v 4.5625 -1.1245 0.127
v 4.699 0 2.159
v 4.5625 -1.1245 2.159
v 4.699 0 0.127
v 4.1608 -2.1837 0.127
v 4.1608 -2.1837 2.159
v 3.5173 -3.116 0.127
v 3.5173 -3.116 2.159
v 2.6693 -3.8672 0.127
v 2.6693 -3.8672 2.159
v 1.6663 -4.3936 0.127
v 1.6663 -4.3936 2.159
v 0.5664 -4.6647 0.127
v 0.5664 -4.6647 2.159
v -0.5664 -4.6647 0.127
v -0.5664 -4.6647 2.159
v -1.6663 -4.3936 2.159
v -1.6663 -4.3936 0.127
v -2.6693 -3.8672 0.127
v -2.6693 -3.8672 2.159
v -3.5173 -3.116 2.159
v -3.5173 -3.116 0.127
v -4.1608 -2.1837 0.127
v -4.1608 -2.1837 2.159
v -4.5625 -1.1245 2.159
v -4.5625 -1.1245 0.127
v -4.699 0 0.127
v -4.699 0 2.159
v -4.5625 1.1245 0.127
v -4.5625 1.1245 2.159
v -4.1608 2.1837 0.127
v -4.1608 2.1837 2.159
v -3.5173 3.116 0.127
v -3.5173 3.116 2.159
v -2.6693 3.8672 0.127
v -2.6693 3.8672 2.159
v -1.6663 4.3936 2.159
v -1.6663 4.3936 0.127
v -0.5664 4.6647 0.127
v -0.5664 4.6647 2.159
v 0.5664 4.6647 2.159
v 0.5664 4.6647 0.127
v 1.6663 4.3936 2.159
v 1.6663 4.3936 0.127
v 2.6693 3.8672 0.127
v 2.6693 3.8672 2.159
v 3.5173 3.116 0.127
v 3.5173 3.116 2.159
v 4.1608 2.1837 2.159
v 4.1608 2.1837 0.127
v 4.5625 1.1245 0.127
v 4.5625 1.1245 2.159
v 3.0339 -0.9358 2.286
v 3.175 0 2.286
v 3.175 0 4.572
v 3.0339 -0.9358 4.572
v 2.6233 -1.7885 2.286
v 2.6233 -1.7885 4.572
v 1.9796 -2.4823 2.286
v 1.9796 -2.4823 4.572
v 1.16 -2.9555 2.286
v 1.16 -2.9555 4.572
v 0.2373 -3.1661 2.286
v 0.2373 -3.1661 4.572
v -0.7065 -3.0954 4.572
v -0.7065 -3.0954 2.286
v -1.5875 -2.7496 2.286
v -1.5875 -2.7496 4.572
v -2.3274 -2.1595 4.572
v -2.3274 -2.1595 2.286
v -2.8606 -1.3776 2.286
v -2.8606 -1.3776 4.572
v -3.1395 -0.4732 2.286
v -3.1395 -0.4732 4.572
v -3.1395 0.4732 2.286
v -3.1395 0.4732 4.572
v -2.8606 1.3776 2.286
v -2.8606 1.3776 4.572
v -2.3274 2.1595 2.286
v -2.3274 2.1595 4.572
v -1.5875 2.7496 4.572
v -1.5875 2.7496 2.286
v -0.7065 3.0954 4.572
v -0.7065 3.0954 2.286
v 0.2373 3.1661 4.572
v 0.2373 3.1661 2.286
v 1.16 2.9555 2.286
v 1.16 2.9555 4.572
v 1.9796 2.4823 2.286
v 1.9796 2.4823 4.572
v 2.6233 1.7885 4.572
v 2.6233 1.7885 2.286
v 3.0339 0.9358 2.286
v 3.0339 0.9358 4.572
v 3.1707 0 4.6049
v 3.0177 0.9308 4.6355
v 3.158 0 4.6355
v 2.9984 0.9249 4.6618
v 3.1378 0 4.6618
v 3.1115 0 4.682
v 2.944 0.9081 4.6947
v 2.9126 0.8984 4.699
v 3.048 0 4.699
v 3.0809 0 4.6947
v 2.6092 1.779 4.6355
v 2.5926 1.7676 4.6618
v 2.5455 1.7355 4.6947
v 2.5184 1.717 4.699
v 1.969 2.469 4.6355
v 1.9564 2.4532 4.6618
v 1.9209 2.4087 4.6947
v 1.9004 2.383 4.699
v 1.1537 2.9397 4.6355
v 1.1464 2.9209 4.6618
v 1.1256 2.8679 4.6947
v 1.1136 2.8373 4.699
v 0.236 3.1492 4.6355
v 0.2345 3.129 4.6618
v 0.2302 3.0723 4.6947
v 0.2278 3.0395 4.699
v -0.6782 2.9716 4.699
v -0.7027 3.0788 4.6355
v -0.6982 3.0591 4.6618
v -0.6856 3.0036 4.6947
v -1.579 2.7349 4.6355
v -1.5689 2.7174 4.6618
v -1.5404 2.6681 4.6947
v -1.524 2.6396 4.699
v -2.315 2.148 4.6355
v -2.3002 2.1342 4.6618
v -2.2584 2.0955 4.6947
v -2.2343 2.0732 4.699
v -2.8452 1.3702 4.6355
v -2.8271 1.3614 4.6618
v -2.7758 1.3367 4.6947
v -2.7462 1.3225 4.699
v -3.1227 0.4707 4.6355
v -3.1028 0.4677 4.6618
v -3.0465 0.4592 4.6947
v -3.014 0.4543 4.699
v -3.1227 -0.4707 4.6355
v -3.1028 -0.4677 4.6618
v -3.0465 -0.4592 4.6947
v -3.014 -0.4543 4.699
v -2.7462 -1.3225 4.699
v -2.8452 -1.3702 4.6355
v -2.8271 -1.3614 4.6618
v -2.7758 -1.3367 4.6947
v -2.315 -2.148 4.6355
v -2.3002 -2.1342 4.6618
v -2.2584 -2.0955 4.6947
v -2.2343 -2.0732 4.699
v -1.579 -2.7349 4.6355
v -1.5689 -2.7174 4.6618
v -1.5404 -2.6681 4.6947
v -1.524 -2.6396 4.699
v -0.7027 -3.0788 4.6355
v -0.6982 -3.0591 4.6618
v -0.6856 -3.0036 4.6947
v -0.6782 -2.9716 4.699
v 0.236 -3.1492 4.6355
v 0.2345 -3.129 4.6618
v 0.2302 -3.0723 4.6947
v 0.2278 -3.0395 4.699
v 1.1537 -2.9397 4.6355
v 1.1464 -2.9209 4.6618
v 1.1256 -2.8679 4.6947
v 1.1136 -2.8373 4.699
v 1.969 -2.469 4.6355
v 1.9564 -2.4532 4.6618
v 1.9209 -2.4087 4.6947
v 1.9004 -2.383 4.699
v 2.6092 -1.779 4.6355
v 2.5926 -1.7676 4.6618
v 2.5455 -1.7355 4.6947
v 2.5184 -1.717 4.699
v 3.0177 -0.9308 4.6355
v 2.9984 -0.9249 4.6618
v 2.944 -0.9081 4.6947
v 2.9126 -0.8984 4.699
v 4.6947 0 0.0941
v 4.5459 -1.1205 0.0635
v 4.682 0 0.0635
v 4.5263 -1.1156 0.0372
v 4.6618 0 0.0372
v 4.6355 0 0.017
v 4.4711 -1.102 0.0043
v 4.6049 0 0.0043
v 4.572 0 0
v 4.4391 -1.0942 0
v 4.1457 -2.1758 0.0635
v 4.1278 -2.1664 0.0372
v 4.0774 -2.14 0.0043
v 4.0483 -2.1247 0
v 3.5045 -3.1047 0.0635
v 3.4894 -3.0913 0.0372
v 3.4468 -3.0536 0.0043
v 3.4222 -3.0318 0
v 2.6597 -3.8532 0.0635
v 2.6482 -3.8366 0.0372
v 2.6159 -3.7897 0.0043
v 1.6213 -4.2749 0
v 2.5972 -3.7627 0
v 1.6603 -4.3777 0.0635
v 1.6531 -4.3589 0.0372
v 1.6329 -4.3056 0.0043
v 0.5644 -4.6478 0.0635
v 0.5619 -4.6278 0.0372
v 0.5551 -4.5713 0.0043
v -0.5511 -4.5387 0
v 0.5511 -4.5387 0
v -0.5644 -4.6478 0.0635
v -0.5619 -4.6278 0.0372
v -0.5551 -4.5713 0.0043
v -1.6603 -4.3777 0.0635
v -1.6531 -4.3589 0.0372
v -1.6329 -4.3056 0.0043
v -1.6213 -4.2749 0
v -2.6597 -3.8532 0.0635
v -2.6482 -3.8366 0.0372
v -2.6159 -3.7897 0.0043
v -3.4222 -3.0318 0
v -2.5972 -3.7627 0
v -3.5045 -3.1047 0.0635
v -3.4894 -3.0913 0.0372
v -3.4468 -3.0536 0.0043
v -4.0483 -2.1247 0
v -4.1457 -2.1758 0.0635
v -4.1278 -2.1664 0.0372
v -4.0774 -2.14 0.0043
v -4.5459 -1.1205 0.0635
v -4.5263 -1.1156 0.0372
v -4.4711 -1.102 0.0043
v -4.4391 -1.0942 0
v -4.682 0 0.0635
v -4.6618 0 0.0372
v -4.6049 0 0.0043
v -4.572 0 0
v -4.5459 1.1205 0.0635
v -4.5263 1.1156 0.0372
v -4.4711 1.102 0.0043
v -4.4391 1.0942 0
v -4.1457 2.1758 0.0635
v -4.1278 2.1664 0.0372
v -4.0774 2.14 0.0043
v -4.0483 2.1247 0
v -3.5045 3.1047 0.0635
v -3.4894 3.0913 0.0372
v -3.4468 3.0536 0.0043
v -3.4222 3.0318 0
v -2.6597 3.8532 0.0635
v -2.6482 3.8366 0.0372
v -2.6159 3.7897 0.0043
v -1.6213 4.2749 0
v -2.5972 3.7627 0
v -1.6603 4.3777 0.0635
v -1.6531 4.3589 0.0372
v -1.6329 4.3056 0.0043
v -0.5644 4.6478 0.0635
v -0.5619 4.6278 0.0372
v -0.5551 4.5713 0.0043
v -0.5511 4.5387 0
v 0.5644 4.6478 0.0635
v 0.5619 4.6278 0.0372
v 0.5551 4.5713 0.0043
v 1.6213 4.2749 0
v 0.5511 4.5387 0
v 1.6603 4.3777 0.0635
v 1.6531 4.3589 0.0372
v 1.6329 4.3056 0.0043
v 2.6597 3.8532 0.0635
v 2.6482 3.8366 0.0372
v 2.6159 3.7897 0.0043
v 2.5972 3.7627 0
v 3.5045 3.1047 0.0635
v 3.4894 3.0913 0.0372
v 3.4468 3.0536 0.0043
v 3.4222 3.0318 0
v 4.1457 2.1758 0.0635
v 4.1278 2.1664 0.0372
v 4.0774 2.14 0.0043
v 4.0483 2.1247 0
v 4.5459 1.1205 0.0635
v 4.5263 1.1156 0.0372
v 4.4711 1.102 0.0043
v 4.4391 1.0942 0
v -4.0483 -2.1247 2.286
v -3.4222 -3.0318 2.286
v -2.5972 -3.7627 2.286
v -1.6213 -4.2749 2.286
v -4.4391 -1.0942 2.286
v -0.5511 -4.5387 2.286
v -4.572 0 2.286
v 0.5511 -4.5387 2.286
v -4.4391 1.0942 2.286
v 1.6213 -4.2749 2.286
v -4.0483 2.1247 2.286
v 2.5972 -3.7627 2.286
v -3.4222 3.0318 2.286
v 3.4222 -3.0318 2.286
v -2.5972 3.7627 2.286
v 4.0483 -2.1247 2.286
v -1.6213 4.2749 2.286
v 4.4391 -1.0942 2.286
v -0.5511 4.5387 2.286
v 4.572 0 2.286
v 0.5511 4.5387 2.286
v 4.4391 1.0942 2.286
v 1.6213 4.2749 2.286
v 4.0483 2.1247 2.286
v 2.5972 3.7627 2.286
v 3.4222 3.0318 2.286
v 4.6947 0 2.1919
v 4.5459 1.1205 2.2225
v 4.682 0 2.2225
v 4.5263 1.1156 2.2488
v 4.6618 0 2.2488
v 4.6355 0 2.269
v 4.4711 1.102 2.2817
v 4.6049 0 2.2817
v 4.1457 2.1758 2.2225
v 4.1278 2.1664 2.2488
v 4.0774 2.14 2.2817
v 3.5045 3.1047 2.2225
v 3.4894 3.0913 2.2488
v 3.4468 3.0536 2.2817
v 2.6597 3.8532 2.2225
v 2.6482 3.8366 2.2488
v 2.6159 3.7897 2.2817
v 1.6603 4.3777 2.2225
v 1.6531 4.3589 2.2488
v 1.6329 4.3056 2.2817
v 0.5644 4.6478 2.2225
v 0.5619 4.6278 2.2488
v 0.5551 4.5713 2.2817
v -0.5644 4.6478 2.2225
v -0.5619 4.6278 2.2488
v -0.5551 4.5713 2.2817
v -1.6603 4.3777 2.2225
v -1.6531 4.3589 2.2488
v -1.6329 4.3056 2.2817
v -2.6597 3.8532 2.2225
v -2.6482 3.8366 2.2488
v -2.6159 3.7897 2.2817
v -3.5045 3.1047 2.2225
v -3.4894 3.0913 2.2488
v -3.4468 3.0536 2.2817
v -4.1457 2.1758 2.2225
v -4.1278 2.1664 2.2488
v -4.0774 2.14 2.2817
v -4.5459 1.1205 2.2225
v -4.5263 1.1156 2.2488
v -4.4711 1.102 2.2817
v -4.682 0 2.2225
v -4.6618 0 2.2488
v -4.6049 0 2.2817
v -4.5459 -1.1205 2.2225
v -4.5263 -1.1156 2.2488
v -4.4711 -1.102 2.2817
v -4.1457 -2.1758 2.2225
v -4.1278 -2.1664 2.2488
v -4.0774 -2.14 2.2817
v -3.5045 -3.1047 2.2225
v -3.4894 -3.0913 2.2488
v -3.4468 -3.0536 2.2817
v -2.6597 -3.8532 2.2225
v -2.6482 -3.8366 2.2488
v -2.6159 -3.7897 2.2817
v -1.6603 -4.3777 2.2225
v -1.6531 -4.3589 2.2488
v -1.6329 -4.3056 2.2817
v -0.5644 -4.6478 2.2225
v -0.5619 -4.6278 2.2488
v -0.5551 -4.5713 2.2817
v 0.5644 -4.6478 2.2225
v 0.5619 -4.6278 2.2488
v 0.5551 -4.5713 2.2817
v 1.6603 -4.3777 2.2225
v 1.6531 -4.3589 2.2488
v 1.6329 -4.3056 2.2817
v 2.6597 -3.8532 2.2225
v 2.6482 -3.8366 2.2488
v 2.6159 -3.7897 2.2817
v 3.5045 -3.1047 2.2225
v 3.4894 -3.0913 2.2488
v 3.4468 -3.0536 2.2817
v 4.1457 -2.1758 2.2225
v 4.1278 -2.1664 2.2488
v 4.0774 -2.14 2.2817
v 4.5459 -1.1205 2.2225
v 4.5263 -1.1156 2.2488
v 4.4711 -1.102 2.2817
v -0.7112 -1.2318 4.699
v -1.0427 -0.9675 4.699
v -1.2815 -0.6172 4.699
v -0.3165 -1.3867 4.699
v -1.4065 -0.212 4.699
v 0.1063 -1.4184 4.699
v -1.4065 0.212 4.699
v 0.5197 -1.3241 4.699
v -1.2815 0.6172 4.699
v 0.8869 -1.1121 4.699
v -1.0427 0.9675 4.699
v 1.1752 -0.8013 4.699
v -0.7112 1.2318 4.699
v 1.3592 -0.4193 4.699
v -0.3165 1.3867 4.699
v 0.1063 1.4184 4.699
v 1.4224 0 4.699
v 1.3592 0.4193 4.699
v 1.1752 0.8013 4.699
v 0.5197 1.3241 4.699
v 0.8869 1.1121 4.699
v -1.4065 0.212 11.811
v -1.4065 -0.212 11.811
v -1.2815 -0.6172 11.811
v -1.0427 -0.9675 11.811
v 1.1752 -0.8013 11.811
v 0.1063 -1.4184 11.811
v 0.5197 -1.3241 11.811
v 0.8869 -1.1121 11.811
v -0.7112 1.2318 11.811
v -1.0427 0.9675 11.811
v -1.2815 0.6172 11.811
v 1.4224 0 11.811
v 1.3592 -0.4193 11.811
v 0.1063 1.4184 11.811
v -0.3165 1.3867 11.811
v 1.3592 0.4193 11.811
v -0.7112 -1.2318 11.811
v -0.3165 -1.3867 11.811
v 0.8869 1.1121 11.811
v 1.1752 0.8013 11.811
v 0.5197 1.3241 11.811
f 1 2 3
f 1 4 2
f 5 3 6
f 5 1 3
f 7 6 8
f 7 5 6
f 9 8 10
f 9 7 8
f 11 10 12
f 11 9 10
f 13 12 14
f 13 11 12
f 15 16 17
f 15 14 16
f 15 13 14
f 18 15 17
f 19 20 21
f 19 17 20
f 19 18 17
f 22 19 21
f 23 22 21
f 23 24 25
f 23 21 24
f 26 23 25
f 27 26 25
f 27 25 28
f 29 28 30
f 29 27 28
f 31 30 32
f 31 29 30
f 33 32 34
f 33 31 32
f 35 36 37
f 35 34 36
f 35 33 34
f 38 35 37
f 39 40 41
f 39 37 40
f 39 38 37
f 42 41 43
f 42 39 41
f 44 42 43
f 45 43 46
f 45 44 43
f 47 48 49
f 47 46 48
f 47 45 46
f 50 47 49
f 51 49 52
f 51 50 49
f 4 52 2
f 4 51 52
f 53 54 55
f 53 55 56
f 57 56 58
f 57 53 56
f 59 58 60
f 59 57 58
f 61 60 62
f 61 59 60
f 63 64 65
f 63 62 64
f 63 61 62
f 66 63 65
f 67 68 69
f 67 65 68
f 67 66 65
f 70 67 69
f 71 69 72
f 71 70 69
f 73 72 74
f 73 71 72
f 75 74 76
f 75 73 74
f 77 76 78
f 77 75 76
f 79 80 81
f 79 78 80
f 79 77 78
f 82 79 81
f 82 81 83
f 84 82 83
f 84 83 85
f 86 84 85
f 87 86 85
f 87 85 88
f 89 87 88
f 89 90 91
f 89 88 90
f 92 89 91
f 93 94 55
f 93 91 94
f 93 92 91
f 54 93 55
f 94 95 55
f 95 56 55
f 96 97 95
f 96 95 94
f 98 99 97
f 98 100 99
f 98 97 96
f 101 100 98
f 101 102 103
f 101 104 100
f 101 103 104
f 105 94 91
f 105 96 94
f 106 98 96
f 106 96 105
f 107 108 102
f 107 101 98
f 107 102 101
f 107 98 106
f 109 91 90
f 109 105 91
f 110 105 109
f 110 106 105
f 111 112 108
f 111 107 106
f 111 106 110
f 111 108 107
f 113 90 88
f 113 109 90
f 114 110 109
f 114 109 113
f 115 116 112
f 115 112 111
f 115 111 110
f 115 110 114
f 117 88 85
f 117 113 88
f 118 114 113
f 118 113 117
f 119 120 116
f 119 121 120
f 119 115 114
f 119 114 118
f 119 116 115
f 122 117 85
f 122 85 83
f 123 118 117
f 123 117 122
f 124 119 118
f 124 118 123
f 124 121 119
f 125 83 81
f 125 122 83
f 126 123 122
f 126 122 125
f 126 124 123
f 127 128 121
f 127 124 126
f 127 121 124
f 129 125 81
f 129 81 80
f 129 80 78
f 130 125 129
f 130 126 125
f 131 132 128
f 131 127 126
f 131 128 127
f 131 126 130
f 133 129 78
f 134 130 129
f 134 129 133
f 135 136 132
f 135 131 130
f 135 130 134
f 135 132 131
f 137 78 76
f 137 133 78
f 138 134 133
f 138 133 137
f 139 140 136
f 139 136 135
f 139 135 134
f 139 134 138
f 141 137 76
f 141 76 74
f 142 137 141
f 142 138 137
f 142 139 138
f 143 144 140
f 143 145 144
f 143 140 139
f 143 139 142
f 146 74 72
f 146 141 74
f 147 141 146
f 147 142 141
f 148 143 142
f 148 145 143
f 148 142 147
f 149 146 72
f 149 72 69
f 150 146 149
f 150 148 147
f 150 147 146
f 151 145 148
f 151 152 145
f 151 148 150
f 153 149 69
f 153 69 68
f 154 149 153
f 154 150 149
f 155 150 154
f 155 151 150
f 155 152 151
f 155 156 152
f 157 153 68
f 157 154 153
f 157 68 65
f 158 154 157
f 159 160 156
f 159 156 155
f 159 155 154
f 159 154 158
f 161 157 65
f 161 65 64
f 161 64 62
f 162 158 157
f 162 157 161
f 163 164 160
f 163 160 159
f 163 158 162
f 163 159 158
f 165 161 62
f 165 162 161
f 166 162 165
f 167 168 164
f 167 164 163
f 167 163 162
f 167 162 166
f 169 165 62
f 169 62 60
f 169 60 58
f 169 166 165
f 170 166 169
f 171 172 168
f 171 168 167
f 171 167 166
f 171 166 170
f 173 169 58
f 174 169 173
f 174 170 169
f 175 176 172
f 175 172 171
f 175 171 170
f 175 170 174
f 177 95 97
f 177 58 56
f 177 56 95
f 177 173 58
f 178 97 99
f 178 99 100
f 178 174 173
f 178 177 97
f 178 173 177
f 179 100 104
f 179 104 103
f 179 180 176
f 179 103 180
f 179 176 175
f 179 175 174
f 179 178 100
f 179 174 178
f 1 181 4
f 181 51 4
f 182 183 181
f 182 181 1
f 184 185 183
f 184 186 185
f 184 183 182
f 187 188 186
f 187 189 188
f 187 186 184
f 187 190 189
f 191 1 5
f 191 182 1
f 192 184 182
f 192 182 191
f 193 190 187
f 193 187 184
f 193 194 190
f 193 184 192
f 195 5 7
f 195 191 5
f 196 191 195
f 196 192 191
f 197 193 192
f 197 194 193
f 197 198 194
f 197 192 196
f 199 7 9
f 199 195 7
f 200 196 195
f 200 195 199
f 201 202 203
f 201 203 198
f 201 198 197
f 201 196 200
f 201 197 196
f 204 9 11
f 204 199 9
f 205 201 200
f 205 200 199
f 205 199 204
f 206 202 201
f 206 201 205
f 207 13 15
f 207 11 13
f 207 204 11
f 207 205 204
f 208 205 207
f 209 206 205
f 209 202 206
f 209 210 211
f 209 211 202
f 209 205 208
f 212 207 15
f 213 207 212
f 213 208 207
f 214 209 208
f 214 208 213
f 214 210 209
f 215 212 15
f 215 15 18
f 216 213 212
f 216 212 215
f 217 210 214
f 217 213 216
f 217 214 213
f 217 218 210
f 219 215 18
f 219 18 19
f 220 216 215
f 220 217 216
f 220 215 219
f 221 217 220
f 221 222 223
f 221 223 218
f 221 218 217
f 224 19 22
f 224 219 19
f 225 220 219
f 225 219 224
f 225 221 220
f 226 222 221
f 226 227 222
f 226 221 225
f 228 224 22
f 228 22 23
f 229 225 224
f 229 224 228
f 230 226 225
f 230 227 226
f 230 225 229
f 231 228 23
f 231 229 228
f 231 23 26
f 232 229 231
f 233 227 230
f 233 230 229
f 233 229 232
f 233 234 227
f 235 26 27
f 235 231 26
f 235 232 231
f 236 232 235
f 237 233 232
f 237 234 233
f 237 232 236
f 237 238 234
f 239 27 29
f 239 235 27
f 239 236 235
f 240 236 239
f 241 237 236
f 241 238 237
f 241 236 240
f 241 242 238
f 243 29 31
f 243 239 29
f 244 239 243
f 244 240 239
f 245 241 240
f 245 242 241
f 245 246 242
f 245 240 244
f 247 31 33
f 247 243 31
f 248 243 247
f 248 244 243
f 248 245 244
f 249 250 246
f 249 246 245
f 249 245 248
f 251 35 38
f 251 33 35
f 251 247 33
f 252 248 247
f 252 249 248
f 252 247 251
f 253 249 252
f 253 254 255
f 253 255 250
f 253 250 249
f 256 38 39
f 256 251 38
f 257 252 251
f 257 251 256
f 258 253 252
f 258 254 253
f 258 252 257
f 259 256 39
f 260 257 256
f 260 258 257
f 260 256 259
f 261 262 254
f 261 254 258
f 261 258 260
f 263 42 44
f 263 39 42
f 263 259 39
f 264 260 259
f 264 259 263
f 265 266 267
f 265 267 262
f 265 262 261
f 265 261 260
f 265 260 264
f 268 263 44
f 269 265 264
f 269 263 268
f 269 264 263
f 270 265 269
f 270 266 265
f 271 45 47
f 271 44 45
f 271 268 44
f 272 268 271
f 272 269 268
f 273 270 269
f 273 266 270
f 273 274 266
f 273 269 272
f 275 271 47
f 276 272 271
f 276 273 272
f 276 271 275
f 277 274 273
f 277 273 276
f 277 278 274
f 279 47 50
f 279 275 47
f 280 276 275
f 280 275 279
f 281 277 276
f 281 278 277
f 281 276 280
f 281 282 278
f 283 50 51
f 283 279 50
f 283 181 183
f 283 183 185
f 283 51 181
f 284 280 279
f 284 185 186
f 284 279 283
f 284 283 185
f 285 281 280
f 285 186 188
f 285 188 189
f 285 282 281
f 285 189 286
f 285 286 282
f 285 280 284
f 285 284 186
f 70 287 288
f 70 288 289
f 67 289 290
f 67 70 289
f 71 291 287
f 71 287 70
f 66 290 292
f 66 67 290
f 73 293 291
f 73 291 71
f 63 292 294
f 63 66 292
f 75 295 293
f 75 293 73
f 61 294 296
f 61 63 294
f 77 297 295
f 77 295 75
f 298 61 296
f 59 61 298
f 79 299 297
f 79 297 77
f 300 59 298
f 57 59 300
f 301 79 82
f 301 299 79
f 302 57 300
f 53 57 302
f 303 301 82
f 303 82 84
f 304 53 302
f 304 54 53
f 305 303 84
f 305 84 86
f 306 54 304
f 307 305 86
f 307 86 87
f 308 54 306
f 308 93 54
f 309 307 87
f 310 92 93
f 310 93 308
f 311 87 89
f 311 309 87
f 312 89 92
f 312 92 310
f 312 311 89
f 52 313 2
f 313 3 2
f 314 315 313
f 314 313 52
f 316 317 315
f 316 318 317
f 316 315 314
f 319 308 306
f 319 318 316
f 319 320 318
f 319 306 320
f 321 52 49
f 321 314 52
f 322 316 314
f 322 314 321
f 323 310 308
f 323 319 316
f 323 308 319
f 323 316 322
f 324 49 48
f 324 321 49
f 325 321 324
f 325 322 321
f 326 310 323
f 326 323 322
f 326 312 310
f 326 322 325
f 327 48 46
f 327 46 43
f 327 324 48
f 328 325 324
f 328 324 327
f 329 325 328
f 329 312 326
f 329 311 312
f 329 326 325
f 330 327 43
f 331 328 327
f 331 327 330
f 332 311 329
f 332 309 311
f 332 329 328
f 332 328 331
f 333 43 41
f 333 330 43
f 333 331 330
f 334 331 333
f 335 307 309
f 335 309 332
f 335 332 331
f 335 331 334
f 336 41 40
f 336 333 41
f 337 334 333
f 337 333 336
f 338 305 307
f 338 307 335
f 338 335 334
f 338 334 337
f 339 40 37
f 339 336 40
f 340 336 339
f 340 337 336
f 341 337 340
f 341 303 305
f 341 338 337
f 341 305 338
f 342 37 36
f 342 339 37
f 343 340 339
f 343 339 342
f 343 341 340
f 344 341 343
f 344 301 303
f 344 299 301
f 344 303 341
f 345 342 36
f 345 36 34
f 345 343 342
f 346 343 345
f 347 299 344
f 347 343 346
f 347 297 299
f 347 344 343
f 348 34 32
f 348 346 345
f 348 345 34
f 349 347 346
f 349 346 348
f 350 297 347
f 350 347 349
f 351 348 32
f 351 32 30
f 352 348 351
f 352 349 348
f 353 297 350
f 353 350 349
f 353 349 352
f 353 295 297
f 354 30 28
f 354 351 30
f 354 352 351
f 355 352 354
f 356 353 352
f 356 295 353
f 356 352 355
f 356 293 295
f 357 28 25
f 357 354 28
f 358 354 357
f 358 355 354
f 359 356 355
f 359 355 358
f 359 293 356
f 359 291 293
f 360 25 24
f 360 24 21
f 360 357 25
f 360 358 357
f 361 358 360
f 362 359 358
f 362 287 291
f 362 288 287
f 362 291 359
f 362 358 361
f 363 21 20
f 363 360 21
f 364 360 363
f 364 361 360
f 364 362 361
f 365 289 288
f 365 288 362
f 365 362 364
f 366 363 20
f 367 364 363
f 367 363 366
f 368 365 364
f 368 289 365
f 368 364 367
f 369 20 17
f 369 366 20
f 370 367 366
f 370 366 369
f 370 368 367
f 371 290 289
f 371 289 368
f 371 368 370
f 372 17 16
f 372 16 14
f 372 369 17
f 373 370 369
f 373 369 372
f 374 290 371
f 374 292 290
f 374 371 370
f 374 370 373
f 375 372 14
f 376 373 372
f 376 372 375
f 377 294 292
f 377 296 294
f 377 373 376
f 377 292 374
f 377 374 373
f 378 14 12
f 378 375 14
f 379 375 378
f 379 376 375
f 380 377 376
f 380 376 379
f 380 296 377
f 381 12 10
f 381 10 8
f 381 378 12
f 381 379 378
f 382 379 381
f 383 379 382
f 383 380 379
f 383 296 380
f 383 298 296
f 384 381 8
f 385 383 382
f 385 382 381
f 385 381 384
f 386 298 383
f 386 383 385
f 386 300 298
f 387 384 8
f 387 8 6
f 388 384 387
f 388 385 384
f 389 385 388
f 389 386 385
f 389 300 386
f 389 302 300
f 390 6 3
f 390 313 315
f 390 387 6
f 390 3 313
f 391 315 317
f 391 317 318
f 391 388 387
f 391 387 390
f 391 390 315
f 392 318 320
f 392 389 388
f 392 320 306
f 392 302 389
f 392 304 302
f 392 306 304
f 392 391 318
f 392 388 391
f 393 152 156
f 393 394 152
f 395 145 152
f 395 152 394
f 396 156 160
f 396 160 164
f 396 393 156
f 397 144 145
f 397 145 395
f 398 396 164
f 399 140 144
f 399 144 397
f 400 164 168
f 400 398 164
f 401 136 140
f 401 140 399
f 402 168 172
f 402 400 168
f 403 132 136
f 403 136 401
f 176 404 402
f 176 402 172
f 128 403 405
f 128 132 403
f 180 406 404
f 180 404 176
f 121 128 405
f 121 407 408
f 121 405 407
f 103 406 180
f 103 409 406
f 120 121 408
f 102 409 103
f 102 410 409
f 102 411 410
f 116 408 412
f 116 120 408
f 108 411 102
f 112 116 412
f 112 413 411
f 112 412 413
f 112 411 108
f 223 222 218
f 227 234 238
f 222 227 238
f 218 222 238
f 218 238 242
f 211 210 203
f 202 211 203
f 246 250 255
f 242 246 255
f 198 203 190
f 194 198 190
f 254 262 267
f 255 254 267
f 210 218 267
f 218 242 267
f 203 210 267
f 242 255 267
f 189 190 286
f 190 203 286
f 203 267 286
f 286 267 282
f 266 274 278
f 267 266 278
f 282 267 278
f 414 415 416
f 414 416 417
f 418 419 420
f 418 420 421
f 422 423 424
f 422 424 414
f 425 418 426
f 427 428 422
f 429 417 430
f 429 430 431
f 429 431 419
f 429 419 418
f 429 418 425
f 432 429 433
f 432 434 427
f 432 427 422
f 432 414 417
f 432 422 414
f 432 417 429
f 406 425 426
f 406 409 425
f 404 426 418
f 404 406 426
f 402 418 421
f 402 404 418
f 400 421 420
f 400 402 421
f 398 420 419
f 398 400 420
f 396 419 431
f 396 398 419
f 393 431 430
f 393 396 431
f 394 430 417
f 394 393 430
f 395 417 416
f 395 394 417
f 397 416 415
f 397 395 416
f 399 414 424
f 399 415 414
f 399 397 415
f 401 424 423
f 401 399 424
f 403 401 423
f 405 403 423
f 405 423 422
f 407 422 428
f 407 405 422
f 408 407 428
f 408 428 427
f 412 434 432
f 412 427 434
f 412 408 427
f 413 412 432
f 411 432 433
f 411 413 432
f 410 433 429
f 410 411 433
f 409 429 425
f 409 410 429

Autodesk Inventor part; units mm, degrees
ref_plane "YZ Plane" through (0, 0, 0) normal (1, 0, 0) x (0, 1, 0)
ref_plane "XZ Plane" through (0, 0, 0) normal (0, 1, 0) x (-1, 0, 0)
ref_plane "XY Plane" through (0, 0, 0) normal (0, 0, 1) x (1, 0, 0)
sketch "Sketch1" plane through (0, 0, 0) normal (0, 0, 1) x (1, 0, 0)
  circle A0 centre (0, 0) radius 4.699
  dimension "head_dia" = 9.398
extrude "Extrusion1" add sketch "Sketch1" along normal blind 2.286
sketch "Sketch2" plane through (0, 0, 2.286) normal (0, 0, 1) x (1, 0, 0)
  circle A0 centre (0, 0) radius 3.175
  dimension "d5" = 6.35
extrude "Extrusion2" add sketch "Sketch2" along normal blind 2.413
sketch "Sketch3" plane through (0, 0, 4.699) normal (0, 0, 1) x (1, 0, 0)
  circle A0 centre (0, 0) radius 1.4224
  dimension "d8" = 2.8448
extrude "Extrusion3" add sketch "Sketch3" along normal blind 7.112
thread "Thread1" size "4-40 UNC" class "2A" standard "ANSI Unified Screw Threads" full length
fillet "Fillet1" radius 0.127 1 edges at (-4.699, 0, 0)
fillet "Fillet2" radius 0.127 1 edges at (-4.699, 0, 2.286)
fillet "Fillet3" radius 0.127 1 edges at (-3.175, 0, 4.699)
properties part number "fastener_screw"
